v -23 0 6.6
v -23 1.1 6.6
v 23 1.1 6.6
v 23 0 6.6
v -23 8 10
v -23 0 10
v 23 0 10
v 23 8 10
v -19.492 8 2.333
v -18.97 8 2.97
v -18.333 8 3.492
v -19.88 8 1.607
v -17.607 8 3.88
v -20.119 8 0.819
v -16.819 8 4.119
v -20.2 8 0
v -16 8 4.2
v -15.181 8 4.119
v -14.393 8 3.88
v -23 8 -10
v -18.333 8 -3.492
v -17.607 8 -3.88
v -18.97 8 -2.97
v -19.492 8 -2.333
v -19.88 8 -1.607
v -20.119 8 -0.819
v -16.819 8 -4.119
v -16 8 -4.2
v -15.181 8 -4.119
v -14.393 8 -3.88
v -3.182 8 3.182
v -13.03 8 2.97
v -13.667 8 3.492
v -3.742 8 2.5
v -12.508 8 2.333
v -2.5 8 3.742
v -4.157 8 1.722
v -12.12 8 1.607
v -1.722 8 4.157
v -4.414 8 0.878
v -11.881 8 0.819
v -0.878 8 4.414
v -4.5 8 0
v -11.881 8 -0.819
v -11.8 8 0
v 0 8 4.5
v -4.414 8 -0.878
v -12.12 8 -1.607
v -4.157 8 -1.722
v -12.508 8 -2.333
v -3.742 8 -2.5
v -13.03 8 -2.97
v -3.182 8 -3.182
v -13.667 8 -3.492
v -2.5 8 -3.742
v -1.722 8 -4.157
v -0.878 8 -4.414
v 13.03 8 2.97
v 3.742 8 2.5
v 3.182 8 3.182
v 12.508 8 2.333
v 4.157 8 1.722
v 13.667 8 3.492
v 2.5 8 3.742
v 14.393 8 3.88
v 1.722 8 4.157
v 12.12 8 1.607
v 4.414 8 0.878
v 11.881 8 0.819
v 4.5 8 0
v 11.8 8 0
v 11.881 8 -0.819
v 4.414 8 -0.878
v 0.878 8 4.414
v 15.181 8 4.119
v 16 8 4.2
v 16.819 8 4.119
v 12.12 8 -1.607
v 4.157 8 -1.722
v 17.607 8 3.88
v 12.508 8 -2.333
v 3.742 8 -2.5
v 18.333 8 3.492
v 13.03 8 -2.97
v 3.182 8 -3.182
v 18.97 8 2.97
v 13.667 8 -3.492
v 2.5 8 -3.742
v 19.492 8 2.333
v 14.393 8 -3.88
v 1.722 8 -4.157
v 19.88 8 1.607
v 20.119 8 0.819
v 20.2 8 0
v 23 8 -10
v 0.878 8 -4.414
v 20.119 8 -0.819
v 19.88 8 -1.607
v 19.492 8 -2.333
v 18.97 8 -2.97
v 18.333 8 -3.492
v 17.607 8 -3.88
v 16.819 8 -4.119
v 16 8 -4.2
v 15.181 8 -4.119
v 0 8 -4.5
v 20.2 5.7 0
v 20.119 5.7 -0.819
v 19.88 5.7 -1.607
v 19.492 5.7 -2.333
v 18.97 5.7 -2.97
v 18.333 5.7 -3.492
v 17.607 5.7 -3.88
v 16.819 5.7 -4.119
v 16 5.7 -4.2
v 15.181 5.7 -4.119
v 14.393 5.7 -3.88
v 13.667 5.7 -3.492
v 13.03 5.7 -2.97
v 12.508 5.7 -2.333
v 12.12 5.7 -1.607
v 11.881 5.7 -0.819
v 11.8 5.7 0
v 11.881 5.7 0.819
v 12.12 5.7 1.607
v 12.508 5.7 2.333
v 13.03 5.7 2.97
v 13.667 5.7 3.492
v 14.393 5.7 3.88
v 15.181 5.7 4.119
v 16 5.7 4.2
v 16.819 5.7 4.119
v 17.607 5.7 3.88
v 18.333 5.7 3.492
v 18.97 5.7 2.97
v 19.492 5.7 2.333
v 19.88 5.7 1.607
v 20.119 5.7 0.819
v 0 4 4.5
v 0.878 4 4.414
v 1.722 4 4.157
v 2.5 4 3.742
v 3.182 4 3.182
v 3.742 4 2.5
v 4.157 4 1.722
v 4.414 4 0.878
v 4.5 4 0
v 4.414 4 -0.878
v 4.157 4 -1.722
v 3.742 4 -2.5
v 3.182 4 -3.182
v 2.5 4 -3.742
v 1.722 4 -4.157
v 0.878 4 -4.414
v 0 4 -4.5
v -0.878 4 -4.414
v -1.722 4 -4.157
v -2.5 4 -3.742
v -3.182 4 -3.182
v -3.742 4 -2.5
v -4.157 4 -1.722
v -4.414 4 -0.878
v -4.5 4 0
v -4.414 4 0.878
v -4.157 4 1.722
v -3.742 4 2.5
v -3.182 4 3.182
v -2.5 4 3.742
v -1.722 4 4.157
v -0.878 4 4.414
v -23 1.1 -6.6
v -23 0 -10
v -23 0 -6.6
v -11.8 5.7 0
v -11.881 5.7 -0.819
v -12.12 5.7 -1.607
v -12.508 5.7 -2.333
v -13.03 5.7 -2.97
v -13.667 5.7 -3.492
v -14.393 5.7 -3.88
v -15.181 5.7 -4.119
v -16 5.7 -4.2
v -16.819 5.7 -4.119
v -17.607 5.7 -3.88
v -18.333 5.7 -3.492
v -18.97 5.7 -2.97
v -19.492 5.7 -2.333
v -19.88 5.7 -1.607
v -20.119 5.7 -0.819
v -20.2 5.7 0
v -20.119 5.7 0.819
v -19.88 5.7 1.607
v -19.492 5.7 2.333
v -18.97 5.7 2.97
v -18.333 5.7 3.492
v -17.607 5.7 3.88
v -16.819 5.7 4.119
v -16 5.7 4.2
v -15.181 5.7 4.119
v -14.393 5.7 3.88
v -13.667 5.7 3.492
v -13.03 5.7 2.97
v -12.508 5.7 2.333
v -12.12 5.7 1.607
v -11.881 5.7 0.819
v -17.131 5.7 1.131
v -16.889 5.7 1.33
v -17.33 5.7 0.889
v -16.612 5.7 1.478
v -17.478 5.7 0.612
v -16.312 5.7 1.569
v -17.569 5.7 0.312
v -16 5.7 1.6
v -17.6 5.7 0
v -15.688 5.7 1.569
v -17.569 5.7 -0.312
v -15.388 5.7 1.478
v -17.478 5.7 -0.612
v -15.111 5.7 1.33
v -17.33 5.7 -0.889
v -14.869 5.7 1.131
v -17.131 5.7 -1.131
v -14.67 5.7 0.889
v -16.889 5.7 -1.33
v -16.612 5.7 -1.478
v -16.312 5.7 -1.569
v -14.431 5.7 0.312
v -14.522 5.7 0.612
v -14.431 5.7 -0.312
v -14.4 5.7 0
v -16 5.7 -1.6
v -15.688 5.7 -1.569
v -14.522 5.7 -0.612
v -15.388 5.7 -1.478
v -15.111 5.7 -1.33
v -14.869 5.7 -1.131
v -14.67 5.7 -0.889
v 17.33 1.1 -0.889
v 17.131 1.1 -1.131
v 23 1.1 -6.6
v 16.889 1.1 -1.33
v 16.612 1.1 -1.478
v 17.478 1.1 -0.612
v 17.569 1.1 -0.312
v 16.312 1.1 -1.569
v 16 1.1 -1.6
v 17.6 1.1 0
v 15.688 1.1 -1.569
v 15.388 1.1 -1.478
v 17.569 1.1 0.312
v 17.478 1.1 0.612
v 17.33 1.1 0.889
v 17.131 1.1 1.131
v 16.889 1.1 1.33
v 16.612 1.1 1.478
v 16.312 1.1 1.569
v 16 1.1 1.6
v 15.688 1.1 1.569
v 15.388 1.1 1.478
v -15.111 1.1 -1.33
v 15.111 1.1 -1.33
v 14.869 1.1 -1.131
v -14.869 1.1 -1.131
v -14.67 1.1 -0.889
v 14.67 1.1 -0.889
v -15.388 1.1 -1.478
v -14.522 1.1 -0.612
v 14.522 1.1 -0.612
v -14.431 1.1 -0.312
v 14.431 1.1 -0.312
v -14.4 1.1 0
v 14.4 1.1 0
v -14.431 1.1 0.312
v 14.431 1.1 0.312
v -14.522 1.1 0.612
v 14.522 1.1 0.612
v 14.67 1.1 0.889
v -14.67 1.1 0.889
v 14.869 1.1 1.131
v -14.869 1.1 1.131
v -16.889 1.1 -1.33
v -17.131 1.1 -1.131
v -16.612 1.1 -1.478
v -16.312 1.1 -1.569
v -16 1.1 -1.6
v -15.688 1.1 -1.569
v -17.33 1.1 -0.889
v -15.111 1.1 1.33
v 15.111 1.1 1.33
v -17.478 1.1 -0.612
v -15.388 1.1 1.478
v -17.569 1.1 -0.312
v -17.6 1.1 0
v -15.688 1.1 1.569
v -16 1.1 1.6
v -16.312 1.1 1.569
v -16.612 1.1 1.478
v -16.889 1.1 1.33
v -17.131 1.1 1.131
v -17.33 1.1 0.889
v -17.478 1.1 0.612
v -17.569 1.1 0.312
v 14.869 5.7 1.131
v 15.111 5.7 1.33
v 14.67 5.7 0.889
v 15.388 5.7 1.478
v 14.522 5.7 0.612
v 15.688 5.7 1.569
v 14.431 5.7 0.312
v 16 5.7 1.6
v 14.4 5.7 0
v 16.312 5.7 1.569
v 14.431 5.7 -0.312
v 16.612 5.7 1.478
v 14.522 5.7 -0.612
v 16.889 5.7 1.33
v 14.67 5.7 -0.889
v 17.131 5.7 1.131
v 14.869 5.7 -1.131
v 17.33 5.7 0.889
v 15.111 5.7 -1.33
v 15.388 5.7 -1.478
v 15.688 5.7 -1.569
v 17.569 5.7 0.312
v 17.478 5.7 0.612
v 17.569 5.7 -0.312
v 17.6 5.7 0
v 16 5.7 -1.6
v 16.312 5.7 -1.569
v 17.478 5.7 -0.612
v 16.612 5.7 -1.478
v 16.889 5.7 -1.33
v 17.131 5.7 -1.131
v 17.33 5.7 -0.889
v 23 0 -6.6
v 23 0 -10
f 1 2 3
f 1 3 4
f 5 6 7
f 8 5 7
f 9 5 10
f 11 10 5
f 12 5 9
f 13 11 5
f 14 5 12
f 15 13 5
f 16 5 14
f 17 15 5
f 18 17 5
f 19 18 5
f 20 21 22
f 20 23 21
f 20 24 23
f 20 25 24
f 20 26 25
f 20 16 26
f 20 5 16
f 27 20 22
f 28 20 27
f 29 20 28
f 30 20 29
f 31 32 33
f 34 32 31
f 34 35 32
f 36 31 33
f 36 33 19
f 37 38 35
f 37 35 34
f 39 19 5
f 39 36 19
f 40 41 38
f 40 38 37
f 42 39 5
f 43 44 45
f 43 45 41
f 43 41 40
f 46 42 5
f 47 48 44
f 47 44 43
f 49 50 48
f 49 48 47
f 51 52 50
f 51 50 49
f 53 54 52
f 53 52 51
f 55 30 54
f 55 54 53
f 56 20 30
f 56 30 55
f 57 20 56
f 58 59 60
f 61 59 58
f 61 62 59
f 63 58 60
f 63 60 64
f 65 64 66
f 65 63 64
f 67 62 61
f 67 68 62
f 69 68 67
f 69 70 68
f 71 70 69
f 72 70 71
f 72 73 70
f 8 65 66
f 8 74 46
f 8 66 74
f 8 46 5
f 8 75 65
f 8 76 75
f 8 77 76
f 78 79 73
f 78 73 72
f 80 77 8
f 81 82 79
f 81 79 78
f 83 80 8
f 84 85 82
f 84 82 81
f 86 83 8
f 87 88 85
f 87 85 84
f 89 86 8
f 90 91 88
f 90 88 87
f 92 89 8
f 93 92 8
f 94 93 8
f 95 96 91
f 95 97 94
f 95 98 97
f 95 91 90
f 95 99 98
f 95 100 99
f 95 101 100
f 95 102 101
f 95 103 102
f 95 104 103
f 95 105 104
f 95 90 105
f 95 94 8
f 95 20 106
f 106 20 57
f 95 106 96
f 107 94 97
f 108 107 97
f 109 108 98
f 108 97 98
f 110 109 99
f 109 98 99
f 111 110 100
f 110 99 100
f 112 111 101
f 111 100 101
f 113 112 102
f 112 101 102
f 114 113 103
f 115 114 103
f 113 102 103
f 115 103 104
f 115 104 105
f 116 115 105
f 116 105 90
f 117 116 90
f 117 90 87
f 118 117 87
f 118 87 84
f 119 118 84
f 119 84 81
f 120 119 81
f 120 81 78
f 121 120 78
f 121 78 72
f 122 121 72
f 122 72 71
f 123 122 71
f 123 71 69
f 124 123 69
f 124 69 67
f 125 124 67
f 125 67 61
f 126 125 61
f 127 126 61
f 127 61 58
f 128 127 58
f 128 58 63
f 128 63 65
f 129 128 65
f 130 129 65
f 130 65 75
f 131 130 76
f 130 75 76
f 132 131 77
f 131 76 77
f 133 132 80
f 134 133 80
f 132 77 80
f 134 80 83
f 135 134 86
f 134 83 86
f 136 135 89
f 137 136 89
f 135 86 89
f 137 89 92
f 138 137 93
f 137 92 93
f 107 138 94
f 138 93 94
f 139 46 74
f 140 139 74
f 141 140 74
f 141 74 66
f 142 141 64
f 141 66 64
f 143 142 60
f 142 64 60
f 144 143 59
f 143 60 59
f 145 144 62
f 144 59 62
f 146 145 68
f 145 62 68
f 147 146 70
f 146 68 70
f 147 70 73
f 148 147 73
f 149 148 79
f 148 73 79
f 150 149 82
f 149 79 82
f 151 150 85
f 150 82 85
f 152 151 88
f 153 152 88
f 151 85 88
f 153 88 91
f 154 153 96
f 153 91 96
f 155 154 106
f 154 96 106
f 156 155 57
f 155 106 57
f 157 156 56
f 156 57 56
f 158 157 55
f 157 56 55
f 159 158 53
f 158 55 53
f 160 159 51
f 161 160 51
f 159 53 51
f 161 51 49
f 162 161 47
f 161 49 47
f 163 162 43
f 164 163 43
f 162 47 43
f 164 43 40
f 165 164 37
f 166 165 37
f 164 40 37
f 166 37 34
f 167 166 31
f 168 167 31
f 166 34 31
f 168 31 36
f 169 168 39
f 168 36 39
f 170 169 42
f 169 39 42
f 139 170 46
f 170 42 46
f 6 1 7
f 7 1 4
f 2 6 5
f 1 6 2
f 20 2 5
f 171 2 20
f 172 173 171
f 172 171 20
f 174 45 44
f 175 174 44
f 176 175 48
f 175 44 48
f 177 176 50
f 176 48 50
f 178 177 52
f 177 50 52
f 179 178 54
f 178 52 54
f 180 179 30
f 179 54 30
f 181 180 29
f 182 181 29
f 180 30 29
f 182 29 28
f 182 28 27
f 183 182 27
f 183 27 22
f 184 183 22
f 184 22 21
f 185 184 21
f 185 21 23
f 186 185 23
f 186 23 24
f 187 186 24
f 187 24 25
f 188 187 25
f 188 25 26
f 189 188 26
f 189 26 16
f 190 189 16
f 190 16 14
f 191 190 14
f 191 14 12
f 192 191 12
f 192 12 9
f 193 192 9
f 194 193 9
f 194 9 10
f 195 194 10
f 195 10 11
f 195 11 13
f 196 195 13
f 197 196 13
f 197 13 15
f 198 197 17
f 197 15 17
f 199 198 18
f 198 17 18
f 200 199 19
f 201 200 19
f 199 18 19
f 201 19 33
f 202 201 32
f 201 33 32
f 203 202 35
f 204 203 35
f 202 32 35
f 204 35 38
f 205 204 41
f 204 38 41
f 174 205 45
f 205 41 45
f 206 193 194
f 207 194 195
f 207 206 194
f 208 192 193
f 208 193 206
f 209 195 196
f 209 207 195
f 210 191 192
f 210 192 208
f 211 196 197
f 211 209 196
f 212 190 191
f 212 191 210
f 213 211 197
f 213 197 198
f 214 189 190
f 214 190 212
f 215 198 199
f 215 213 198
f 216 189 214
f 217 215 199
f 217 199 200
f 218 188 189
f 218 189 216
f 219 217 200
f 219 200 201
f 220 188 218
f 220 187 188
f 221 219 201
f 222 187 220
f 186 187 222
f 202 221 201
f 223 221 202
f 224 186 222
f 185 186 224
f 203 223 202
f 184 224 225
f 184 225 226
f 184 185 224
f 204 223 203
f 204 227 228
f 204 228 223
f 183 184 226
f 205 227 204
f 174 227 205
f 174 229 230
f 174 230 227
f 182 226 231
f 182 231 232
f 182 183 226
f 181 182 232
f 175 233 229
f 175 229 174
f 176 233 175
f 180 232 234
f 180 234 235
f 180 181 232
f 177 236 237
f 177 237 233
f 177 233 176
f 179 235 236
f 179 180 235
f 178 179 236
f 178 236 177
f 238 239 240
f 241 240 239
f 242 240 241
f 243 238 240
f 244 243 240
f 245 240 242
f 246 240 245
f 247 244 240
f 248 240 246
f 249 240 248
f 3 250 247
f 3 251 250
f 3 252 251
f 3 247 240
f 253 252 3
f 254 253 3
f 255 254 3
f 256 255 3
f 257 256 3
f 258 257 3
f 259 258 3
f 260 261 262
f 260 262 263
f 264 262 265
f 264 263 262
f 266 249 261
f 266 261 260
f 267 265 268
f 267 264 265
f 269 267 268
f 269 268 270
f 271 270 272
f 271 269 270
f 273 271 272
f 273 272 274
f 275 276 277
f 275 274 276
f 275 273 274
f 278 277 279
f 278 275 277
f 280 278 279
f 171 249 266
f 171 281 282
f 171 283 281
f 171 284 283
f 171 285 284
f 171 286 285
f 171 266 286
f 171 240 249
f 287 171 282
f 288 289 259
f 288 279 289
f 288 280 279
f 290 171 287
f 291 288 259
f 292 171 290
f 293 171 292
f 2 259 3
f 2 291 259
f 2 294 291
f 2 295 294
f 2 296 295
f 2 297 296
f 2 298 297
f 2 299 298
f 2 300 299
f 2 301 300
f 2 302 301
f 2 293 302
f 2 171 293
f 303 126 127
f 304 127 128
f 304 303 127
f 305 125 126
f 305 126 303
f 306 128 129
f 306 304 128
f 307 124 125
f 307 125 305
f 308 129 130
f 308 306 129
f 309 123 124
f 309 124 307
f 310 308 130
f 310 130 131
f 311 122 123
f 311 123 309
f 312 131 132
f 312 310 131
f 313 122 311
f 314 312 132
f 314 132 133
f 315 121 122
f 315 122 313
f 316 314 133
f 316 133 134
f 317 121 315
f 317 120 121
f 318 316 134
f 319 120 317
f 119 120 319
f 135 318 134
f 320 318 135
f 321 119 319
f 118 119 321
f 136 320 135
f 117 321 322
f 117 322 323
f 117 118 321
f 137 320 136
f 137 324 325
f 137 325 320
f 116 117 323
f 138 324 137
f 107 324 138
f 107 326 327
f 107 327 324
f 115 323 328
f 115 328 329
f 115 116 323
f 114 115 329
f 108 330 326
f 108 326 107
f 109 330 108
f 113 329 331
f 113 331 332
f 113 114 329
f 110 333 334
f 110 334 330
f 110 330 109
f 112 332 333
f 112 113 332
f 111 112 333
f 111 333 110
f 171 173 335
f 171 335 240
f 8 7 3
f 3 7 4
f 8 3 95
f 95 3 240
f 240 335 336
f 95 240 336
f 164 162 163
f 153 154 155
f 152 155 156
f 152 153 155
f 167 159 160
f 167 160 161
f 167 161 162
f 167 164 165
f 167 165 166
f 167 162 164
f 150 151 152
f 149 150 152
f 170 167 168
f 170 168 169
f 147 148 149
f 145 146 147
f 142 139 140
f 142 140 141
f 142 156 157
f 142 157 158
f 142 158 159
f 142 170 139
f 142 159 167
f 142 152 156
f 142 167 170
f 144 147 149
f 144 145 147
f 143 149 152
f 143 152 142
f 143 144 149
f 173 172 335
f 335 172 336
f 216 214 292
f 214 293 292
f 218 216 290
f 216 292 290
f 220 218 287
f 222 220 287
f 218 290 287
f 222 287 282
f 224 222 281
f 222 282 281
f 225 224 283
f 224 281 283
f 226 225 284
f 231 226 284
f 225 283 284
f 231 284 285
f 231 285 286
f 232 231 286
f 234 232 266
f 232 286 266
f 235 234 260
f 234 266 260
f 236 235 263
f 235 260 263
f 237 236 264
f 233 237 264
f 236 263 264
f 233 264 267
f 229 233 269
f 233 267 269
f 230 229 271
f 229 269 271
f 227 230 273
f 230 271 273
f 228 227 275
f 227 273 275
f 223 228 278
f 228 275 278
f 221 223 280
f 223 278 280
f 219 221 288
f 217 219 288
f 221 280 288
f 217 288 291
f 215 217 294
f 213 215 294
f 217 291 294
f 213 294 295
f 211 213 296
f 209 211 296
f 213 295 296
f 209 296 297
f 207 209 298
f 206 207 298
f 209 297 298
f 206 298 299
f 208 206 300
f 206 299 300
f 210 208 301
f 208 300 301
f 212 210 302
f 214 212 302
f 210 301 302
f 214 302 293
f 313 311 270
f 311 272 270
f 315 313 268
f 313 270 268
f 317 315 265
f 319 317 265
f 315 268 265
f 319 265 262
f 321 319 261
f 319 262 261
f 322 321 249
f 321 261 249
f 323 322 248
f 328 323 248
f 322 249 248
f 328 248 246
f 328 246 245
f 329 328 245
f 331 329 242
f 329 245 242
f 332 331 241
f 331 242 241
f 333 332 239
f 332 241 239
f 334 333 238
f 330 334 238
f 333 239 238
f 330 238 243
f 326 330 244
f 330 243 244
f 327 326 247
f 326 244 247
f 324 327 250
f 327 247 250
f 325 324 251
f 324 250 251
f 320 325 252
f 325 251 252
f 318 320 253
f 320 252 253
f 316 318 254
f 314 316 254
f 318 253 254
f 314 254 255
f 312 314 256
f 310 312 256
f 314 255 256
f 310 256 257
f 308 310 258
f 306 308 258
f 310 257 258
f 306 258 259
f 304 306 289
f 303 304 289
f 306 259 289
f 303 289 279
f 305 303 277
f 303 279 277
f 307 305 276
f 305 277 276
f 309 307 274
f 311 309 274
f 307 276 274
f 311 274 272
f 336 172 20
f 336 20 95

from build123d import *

# Parameters (mm, degrees)
SKETCH1_W                                        = 46
SKETCH1_H                                        = 20
BOSS_EXTRUDE1_DEPTH                              = 8
SKETCH3_R                                        = 4.5
CUT_EXTRUDE2_DEPTH                               = 4
CUT_EXTRUDE3_REACH                               = 49.749
CBORE_FOR_M3_HEX_HEAD_MACHINE_SCREW1_D           = 3.2
CBORE_FOR_M3_HEX_HEAD_MACHINE_SCREW1_CBORE_D     = 8.4
CBORE_FOR_M3_HEX_HEAD_MACHINE_SCREW1_CBORE_DEPTH = 2.3


with BuildPart() as part:
    # Sketch1 → Boss-Extrude1 (new body)
    with BuildSketch(Plane(origin=(0, 0, 0), x_dir=(1, 0, 0), z_dir=(0, 1, 0))):
        Rectangle(SKETCH1_W, SKETCH1_H)
    extrude(amount=BOSS_EXTRUDE1_DEPTH)

    # Sketch3 → Cut-Extrude2 (cut)
    with BuildSketch(Plane(origin=(0, 8, 0), x_dir=(1, 0, 0), z_dir=(0, 1, 0))):
        with Locations(Location((0, 0, 0), (0, 0, 270))):
            Circle(SKETCH3_R)
    extrude(amount=-CUT_EXTRUDE2_DEPTH, mode=Mode.SUBTRACT)

    # Sketch8 → Cut-Extrude3 (cut, up to next)
    with BuildSketch(Plane.ZY.offset(23), mode=Mode.PRIVATE) as cut_extrude3_sk1:
        Polygon((0, 0), (-6.6, 0), (-6.6, 1.1), (6.6, 1.1), (6.6, 0), align=None)
    cut_extrude3_tool1 = extrude(cut_extrude3_sk1.sketch, amount=-CUT_EXTRUDE3_REACH, mode=Mode.PRIVATE) & part.part
    add(cut_extrude3_tool1.solids().sort_by_distance((-23, 0.55, 0))[0], mode=Mode.SUBTRACT)

    # CBORE for M3 Hex Head Machine Screw1 (through all)
    with Locations(Plane(origin=(0, 8, 0), x_dir=(1, 0, 0), z_dir=(0, 1, 0))):
        with Locations((-16, 0), (16, 0)):
            CounterBoreHole(CBORE_FOR_M3_HEX_HEAD_MACHINE_SCREW1_D / 2, CBORE_FOR_M3_HEX_HEAD_MACHINE_SCREW1_CBORE_D / 2, CBORE_FOR_M3_HEX_HEAD_MACHINE_SCREW1_CBORE_DEPTH)


solid = part.part
